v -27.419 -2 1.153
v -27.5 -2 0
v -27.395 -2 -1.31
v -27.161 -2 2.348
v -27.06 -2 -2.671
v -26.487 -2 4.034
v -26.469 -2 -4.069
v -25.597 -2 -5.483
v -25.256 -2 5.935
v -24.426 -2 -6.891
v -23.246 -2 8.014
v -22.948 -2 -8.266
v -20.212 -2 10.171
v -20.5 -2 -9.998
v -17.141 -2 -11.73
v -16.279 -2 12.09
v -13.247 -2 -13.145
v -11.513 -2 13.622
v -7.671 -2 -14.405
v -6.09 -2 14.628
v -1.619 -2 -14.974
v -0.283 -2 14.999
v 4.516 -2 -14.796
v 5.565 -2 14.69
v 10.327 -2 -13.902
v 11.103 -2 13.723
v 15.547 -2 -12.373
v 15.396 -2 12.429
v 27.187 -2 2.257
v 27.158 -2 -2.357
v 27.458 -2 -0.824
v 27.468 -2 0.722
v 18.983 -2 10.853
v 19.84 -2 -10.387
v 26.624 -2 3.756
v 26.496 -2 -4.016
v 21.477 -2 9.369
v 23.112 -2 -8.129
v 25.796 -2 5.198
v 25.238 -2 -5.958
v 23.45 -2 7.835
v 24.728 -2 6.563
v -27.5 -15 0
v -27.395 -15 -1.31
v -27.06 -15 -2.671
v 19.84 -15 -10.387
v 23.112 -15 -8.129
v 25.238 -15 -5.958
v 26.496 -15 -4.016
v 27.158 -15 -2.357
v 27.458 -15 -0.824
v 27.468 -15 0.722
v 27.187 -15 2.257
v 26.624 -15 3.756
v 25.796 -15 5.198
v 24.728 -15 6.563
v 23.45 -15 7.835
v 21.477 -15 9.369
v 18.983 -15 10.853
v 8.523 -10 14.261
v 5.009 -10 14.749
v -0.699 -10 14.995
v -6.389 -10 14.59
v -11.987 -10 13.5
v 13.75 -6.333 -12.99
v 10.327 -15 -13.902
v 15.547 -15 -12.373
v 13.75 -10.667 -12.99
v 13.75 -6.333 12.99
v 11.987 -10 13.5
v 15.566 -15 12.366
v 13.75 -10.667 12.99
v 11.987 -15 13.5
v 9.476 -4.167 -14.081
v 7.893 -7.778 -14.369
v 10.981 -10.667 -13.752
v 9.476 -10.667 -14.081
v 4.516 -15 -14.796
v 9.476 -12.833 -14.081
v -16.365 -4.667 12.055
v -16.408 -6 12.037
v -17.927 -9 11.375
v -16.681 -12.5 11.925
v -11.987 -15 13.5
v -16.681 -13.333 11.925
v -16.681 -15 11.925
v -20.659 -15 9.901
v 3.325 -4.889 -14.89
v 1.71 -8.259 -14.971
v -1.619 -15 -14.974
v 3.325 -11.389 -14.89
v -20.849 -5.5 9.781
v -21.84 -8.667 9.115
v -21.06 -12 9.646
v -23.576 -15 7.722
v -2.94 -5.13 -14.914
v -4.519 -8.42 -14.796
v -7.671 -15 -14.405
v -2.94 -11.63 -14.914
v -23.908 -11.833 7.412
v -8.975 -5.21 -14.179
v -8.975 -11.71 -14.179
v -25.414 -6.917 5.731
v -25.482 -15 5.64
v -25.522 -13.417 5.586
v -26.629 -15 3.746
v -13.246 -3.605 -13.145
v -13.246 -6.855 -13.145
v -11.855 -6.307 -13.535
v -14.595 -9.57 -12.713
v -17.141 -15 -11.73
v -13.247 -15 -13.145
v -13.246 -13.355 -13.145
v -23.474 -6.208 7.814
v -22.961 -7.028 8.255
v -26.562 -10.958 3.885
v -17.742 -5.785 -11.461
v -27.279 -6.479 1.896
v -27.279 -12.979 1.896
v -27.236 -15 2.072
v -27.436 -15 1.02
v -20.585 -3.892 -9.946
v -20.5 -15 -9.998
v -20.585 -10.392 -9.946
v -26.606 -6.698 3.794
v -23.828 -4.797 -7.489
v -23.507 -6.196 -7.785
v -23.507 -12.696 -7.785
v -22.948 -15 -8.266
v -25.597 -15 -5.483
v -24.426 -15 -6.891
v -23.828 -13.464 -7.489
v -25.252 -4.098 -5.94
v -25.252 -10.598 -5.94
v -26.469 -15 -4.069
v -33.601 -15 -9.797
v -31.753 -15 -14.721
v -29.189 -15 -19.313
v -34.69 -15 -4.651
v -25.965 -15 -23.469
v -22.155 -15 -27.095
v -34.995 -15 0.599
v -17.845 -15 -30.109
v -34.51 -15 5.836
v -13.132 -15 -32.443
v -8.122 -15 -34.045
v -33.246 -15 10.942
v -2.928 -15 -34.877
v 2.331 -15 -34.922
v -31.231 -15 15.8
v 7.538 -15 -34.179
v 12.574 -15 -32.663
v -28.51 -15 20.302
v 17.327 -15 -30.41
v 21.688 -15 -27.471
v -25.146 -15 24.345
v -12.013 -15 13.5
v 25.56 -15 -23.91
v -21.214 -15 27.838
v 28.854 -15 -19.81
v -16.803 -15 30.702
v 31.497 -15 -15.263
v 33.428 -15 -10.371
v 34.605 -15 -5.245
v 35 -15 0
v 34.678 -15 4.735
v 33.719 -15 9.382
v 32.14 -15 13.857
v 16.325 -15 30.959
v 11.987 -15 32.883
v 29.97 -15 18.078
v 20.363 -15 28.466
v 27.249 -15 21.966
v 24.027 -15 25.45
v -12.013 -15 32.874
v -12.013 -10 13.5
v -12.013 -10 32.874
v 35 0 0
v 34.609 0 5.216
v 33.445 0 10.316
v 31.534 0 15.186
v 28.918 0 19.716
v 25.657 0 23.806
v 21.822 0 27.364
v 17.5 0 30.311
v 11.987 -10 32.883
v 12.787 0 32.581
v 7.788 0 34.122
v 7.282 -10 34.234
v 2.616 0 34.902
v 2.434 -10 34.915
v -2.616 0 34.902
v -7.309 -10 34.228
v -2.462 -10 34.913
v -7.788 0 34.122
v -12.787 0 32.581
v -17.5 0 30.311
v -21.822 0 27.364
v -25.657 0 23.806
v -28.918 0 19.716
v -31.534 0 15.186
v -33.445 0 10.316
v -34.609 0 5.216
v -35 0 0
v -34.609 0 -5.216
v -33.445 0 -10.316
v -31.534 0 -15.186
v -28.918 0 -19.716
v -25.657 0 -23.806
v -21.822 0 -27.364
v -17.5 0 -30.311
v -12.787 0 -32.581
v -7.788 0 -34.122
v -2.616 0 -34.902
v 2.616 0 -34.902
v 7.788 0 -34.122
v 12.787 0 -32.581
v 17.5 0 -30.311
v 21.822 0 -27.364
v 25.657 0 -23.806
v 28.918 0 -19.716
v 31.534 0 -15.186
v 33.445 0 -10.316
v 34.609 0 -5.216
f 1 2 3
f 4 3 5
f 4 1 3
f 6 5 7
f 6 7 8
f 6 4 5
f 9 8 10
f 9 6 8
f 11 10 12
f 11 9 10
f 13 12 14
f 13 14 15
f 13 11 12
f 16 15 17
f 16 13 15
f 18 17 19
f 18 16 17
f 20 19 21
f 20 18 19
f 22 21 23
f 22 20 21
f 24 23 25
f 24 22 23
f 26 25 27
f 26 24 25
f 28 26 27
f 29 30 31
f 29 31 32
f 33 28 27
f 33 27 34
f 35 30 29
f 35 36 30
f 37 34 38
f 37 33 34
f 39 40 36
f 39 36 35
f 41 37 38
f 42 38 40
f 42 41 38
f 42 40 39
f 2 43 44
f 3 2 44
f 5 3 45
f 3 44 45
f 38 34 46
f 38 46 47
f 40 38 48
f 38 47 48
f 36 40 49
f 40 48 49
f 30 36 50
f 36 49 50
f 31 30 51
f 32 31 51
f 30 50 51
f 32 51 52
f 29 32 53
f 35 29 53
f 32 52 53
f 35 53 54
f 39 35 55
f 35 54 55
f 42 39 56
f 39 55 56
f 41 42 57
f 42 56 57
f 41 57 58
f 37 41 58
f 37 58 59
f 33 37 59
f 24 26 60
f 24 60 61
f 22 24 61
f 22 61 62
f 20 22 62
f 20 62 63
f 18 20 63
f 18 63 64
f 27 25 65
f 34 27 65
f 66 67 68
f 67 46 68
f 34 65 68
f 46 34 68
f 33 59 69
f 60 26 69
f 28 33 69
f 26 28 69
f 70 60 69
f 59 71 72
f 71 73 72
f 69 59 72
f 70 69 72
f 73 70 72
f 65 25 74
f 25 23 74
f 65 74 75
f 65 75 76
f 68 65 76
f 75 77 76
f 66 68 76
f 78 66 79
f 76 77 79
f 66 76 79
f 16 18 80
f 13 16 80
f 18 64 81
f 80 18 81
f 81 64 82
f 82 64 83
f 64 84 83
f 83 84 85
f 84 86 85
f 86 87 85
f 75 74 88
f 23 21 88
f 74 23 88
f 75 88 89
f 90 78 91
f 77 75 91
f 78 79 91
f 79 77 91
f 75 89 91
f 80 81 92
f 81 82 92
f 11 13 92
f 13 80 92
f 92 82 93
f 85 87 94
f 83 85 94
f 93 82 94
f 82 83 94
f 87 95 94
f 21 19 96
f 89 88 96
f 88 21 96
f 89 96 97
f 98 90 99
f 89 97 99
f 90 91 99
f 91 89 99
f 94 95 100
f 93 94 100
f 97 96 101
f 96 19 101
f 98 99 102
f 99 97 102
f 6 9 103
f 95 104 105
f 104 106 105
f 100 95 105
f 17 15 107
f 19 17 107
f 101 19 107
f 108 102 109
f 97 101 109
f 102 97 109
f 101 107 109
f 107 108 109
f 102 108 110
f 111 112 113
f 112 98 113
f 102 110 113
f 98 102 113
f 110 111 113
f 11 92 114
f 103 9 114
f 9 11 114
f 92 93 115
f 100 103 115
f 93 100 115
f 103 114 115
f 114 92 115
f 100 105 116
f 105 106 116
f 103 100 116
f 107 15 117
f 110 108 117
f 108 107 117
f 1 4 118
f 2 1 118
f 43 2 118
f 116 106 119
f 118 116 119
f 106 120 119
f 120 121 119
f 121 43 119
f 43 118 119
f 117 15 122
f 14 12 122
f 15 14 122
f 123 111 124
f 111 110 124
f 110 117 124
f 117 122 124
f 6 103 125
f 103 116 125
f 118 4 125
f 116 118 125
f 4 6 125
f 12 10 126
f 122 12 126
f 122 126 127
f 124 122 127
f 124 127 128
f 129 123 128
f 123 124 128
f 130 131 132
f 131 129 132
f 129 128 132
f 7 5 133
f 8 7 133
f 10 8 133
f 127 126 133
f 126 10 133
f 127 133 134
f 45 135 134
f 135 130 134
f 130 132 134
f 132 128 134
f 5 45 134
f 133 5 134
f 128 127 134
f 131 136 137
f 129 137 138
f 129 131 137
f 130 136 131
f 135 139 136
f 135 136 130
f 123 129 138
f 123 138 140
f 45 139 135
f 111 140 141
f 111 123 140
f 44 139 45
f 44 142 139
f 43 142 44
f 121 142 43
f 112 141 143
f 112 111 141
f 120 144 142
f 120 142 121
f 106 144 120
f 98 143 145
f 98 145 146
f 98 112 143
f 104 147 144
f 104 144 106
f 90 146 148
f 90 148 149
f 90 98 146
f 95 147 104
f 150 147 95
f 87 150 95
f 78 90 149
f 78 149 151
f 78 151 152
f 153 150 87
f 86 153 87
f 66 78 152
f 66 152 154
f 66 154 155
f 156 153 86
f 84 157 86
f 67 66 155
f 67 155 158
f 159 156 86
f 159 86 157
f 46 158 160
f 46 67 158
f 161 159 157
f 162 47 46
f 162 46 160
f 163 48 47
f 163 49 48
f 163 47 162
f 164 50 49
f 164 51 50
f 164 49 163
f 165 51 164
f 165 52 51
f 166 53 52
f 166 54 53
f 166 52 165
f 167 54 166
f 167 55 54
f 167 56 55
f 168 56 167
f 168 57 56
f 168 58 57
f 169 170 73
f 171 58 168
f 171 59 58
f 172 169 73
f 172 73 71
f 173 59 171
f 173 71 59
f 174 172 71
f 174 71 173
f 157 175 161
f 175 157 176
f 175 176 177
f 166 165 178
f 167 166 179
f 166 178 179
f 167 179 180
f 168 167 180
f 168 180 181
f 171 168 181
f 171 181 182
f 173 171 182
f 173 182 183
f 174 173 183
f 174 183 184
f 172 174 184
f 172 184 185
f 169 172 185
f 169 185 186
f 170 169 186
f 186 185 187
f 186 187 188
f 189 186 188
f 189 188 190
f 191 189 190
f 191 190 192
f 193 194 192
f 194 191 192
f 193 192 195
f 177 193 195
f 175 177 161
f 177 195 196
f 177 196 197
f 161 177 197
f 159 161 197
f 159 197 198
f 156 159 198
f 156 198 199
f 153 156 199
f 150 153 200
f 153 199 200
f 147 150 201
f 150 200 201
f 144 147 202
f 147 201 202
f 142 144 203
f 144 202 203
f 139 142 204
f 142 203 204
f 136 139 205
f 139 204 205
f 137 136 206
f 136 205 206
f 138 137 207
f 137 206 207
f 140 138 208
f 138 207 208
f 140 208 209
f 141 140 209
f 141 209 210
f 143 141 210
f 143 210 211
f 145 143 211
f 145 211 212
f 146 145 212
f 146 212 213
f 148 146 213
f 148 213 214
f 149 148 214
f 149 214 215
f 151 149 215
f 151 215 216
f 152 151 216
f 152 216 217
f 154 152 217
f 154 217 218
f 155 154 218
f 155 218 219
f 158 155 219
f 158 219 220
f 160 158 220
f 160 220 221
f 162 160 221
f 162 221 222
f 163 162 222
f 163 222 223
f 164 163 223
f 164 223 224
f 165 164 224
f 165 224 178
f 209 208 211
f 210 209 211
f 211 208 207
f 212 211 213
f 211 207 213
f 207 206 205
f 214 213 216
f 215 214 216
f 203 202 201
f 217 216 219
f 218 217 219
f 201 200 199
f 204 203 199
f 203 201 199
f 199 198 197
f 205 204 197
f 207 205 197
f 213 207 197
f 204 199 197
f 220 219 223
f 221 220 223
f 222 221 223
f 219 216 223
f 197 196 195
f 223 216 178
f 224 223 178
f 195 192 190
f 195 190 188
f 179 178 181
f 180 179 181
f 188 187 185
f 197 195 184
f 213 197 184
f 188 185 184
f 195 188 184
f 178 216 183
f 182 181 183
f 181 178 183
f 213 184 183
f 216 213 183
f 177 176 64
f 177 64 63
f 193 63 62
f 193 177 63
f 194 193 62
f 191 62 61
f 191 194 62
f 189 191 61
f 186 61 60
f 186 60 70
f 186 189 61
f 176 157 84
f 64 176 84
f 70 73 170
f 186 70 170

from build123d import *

# Parameters (mm, degrees)
F0_R     = 35
F1_DEPTH = 15
F3_DEPTH = 13
F4_W     = 24
F4_H     = 24
F5_DEPTH = 5


with BuildPart() as f1:
    # F0 (on Front) → F1 (new body)
    with BuildSketch(Plane.XZ):
        Circle(F0_R)
    extrude(amount=F1_DEPTH)

    # F2 (on face) → F3 (cut)
    with BuildSketch(Plane.XZ.offset(15)):
        with BuildLine():
            add(Edge.make_bspline(
                [(-27.5, 0), (-27.5, -25.980762), (13.75, -12.990381), (55, 0), (13.75, 12.990381), (-27.5, 25.980762), (-27.5, 0)],
                knots=[0, 0, 0, 2.094395, 2.094395, 4.18879, 4.18879, 6.283185, 6.283185, 6.283185], degree=2, weights=[1, 0.5, 1, 0.5, 1, 0.5, 1]))
        make_face()
    extrude(amount=-F3_DEPTH, mode=Mode.SUBTRACT)

    # F4 (on face) → F5 (cut)
    with BuildSketch(Plane.XZ.offset(15)):
        with Locations((-0.013028, 25.5)):
            Rectangle(F4_W, F4_H)
    extrude(amount=-F5_DEPTH, mode=Mode.SUBTRACT)


solid = f1.part
